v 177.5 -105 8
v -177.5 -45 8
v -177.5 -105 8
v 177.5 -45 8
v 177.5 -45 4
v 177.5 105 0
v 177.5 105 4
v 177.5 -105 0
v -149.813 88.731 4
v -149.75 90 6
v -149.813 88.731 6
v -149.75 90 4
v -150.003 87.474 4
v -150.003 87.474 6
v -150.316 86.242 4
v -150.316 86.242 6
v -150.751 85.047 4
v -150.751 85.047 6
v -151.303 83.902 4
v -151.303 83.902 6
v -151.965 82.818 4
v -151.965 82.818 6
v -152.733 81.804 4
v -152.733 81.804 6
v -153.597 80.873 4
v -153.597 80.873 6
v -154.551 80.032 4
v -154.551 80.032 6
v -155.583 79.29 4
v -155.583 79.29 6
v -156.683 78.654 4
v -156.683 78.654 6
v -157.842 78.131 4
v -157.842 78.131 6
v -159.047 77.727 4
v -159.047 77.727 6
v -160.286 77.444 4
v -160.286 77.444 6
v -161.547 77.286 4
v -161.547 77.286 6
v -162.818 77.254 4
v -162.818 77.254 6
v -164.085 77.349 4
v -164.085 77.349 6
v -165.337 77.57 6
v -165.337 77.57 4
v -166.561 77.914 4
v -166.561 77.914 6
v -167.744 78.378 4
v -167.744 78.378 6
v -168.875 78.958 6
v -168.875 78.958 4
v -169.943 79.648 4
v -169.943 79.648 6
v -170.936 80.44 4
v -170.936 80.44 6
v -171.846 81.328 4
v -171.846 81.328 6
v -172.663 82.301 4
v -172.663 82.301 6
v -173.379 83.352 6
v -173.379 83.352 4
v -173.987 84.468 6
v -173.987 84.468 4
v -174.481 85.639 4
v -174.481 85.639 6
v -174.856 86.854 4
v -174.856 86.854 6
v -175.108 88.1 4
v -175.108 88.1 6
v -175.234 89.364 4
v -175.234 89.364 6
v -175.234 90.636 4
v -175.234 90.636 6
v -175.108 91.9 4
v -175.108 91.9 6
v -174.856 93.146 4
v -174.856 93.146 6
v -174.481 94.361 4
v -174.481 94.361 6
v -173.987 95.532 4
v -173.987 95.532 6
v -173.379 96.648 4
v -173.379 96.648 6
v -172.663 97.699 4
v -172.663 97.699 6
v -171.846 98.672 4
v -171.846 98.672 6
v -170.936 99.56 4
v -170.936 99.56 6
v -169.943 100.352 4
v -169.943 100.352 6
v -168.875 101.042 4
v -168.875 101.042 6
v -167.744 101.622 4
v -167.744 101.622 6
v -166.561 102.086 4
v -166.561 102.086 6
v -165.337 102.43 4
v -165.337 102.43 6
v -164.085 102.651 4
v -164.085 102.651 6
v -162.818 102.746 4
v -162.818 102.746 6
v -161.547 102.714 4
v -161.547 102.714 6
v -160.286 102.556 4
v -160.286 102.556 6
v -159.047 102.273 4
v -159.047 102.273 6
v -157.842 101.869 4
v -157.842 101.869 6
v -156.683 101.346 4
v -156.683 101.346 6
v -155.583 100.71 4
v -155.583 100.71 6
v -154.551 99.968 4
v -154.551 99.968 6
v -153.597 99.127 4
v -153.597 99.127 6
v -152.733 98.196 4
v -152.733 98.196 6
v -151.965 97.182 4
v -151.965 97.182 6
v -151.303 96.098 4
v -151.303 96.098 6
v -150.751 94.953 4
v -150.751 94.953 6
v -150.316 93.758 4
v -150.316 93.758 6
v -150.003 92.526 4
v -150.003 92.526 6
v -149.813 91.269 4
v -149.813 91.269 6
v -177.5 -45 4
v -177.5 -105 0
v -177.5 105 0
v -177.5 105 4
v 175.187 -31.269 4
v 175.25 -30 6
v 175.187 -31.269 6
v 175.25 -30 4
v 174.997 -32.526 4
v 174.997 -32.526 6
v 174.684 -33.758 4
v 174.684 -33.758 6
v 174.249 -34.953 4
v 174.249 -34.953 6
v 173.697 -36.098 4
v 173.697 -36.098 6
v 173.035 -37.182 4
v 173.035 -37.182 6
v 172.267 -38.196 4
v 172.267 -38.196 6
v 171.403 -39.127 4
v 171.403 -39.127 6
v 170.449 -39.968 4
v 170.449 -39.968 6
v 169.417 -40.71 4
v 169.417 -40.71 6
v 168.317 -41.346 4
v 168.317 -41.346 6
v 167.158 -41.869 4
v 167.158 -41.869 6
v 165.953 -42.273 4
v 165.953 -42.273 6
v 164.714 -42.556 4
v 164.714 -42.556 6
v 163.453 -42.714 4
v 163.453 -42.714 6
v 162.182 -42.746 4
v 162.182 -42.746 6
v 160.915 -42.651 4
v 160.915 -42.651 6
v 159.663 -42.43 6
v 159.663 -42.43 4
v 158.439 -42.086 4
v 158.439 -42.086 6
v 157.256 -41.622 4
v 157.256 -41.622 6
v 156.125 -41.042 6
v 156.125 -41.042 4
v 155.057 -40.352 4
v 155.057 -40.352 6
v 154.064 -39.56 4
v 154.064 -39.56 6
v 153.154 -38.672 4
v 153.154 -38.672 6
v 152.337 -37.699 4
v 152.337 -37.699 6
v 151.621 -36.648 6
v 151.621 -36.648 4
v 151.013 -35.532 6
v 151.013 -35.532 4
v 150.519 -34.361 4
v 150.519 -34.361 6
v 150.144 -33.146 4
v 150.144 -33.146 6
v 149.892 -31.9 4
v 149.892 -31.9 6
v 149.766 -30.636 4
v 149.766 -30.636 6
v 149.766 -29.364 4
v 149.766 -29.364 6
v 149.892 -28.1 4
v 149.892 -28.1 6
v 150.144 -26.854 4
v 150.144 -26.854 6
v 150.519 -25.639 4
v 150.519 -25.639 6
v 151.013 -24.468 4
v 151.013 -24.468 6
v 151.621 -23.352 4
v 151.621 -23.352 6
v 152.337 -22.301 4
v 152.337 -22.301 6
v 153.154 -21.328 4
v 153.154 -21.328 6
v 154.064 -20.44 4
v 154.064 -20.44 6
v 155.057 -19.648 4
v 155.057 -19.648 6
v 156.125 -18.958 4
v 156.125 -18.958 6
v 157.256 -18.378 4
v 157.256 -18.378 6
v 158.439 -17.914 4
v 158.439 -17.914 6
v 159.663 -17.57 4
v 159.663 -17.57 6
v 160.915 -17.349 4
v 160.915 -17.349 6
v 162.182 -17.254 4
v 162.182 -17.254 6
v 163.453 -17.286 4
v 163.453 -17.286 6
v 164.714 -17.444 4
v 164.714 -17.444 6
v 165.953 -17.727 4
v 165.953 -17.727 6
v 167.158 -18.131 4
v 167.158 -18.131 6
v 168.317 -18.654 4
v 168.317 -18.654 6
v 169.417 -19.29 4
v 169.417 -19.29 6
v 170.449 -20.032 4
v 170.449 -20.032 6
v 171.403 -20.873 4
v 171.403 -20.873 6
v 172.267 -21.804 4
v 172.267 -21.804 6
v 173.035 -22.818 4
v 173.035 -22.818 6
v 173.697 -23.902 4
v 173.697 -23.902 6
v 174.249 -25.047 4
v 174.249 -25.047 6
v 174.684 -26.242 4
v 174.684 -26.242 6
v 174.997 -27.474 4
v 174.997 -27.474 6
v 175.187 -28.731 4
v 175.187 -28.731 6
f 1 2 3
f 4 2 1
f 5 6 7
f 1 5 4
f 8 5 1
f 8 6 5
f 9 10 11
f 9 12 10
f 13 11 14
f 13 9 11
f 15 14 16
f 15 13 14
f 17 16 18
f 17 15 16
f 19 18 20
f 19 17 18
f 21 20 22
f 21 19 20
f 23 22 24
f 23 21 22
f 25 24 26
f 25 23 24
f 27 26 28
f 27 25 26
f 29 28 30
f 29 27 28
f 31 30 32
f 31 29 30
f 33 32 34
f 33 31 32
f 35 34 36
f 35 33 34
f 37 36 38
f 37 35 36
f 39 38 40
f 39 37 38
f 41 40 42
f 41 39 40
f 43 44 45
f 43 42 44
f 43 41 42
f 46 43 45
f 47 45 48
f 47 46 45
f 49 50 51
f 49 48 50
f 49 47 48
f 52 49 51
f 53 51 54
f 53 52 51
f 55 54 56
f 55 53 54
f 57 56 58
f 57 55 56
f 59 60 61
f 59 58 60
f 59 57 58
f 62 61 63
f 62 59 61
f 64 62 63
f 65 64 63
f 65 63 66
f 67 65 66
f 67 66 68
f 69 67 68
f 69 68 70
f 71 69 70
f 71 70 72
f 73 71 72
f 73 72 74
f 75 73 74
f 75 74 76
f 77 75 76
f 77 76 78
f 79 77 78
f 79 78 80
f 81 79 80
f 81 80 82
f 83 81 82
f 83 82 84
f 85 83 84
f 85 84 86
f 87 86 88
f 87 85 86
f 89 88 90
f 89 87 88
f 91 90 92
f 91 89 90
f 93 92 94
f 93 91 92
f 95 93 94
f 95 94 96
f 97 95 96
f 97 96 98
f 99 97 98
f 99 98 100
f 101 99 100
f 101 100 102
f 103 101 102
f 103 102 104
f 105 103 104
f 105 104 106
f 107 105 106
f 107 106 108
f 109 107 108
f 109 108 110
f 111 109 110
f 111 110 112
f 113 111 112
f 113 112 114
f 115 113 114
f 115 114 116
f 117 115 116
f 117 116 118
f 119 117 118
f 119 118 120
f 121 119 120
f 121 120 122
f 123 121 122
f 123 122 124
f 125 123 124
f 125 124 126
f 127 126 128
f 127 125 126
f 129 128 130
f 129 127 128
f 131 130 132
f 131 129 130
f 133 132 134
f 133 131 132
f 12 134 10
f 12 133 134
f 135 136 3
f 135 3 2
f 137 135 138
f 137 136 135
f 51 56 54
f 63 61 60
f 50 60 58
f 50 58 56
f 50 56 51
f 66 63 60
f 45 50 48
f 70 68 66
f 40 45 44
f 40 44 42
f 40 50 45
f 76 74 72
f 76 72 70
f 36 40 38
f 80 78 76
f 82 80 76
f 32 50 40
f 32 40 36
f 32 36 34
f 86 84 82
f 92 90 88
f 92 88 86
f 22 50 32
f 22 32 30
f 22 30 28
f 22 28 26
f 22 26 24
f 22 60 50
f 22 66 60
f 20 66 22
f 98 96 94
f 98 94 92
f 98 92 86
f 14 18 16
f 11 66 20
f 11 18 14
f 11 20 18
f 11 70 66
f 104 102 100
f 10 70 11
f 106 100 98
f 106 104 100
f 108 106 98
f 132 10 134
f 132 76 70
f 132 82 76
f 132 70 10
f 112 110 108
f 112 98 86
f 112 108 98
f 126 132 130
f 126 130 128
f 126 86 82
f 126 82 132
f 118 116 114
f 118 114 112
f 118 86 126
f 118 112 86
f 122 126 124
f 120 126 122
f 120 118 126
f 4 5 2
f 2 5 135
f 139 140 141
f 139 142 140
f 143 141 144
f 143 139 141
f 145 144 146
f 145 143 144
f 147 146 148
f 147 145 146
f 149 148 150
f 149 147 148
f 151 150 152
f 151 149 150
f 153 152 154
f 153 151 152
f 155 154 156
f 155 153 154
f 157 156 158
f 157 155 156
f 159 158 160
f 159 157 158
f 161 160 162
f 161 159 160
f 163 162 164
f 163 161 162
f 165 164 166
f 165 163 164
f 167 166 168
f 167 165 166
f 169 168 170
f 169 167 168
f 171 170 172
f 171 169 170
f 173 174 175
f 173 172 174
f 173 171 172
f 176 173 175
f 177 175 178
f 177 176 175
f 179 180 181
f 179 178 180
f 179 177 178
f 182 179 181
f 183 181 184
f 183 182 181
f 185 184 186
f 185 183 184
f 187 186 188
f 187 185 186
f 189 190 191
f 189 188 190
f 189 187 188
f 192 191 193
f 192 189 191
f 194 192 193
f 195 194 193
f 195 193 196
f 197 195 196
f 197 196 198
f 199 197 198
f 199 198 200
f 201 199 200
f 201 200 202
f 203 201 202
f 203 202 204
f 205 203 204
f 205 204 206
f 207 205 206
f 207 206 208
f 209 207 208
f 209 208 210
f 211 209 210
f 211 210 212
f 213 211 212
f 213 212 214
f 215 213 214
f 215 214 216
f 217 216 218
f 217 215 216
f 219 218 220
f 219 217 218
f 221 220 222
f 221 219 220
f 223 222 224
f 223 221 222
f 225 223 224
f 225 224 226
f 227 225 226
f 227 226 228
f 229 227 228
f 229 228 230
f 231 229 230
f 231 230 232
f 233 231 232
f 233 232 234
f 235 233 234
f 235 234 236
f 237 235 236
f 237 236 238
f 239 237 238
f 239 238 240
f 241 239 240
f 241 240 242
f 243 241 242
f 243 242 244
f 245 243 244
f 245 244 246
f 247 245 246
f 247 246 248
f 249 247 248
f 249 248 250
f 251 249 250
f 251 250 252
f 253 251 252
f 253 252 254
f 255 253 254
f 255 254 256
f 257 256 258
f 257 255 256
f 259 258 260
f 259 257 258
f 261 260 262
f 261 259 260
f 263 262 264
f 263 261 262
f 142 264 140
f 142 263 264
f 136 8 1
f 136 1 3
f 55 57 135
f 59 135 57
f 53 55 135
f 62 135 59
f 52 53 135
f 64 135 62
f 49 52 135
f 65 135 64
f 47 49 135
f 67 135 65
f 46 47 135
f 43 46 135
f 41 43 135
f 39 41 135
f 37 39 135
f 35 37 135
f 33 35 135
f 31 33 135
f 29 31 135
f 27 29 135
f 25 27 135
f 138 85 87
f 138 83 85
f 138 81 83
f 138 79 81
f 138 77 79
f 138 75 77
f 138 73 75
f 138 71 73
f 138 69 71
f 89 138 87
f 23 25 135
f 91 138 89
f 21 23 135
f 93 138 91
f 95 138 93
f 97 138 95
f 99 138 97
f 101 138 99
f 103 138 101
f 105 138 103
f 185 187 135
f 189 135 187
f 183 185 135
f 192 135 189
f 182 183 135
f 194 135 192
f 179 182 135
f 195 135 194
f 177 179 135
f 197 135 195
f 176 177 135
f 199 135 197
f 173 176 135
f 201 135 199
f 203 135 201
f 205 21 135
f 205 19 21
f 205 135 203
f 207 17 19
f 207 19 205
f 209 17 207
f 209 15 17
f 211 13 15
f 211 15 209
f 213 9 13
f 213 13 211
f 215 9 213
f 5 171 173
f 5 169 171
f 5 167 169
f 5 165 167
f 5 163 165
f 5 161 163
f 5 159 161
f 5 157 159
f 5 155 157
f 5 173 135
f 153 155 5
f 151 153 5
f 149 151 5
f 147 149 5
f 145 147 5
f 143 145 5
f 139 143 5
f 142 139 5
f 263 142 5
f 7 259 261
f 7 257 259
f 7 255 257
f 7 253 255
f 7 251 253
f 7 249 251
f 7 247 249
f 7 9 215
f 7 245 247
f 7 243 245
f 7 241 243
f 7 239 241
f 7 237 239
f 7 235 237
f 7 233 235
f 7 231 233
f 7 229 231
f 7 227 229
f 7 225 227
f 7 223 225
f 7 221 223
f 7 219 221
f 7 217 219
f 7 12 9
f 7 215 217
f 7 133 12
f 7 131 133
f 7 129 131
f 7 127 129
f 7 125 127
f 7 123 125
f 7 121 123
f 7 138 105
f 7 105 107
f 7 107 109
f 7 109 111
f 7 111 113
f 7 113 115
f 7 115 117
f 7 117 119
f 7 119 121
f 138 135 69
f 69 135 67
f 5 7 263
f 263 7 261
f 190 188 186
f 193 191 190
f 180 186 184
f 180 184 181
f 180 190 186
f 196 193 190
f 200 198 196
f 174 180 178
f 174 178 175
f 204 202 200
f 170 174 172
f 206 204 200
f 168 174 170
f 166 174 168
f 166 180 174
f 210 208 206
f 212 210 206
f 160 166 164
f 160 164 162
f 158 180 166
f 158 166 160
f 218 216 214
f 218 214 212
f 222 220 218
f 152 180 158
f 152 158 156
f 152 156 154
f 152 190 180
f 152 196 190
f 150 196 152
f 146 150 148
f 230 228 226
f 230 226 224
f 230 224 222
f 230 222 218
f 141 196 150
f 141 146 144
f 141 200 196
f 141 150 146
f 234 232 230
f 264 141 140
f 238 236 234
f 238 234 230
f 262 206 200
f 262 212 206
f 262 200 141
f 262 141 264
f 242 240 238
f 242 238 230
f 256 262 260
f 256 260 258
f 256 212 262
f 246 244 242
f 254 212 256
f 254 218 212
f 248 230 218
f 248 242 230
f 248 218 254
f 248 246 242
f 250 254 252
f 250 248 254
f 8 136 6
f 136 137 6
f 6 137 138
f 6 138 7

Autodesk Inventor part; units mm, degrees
ref_plane "YZ Plane" through (0, 0, 0) normal (1, 0, 0) x (0, 1, 0)
ref_plane "XZ Plane" through (0, 0, 0) normal (0, 1, 0) x (-1, 0, 0)
ref_plane "XY Plane" through (0, 0, 0) normal (0, 0, 1) x (1, 0, 0)
sketch "Эскиз1" plane through (0, 0, 0) normal (0, 0, 1) x (1, 0, 0)
  line L0 (-177.5, 105) -> (177.5, 105)
  line L1 (177.5, 105) -> (177.5, -105)
  line L2 (177.5, -105) -> (-177.5, -105)
  line L3 (-177.5, -105) -> (-177.5, 105)
  line L4 (-177.5, 105) -> (177.5, -105) construction
  line L5 (177.5, 105) -> (-177.5, -105) construction
  point P0 (0, 0)
  dimension "d0" = 355
  dimension "d1" = 210
extrude "Выдавливание1" add sketch "Эскиз1" along normal blind 4
sketch "Эскиз2" plane through (0, 0, 4) normal (0, 0, 1) x (1, 0, 0)
  line L0 (-177.5, -105) -> (177.5, -105) projected
  line L1 (177.5, -105) -> (177.5, 105) projected
  line L2 (-177.5, -105) -> (177.5, -105)
  line L3 (177.5, -105) -> (177.5, -45)
  line L4 (177.5, -45) -> (-177.5, -45)
  line L5 (-177.5, -45) -> (-177.5, -105)
  point P0 (0, 0)
  dimension "d4" = 60
extrude "Выдавливание2" add sketch "Эскиз2" along normal blind 4
sketch "Эскиз3" plane through (0, 0, 4) normal (0, 0, 1) x (1, 0, 0)
  circle A0 centre (-162.5, 90) radius 15
  circle A1 centre (162.5, -30) radius 15
  line L0 (177.5, 105) -> (-177.5, 105) construction
  line L1 (-177.5, 105) -> (-177.5, -45) construction
  line L2 (177.5, -45) -> (-177.5, -45) construction
  line L3 (177.5, -45) -> (177.5, 105) construction
  circle A2 centre (-162.5, 90) radius 12.75
  circle A3 centre (162.5, -30) radius 12.75
  point P0 (0, 0)
  dimension "d14" = 30
  dimension "d15" = 30
  dimension "d16" = 25.5
  dimension "d17" = 25.5
extrude "Выдавливание3" add sketch "Эскиз3" along normal blind 2 contours A2 | A3
properties part number "монитор"
